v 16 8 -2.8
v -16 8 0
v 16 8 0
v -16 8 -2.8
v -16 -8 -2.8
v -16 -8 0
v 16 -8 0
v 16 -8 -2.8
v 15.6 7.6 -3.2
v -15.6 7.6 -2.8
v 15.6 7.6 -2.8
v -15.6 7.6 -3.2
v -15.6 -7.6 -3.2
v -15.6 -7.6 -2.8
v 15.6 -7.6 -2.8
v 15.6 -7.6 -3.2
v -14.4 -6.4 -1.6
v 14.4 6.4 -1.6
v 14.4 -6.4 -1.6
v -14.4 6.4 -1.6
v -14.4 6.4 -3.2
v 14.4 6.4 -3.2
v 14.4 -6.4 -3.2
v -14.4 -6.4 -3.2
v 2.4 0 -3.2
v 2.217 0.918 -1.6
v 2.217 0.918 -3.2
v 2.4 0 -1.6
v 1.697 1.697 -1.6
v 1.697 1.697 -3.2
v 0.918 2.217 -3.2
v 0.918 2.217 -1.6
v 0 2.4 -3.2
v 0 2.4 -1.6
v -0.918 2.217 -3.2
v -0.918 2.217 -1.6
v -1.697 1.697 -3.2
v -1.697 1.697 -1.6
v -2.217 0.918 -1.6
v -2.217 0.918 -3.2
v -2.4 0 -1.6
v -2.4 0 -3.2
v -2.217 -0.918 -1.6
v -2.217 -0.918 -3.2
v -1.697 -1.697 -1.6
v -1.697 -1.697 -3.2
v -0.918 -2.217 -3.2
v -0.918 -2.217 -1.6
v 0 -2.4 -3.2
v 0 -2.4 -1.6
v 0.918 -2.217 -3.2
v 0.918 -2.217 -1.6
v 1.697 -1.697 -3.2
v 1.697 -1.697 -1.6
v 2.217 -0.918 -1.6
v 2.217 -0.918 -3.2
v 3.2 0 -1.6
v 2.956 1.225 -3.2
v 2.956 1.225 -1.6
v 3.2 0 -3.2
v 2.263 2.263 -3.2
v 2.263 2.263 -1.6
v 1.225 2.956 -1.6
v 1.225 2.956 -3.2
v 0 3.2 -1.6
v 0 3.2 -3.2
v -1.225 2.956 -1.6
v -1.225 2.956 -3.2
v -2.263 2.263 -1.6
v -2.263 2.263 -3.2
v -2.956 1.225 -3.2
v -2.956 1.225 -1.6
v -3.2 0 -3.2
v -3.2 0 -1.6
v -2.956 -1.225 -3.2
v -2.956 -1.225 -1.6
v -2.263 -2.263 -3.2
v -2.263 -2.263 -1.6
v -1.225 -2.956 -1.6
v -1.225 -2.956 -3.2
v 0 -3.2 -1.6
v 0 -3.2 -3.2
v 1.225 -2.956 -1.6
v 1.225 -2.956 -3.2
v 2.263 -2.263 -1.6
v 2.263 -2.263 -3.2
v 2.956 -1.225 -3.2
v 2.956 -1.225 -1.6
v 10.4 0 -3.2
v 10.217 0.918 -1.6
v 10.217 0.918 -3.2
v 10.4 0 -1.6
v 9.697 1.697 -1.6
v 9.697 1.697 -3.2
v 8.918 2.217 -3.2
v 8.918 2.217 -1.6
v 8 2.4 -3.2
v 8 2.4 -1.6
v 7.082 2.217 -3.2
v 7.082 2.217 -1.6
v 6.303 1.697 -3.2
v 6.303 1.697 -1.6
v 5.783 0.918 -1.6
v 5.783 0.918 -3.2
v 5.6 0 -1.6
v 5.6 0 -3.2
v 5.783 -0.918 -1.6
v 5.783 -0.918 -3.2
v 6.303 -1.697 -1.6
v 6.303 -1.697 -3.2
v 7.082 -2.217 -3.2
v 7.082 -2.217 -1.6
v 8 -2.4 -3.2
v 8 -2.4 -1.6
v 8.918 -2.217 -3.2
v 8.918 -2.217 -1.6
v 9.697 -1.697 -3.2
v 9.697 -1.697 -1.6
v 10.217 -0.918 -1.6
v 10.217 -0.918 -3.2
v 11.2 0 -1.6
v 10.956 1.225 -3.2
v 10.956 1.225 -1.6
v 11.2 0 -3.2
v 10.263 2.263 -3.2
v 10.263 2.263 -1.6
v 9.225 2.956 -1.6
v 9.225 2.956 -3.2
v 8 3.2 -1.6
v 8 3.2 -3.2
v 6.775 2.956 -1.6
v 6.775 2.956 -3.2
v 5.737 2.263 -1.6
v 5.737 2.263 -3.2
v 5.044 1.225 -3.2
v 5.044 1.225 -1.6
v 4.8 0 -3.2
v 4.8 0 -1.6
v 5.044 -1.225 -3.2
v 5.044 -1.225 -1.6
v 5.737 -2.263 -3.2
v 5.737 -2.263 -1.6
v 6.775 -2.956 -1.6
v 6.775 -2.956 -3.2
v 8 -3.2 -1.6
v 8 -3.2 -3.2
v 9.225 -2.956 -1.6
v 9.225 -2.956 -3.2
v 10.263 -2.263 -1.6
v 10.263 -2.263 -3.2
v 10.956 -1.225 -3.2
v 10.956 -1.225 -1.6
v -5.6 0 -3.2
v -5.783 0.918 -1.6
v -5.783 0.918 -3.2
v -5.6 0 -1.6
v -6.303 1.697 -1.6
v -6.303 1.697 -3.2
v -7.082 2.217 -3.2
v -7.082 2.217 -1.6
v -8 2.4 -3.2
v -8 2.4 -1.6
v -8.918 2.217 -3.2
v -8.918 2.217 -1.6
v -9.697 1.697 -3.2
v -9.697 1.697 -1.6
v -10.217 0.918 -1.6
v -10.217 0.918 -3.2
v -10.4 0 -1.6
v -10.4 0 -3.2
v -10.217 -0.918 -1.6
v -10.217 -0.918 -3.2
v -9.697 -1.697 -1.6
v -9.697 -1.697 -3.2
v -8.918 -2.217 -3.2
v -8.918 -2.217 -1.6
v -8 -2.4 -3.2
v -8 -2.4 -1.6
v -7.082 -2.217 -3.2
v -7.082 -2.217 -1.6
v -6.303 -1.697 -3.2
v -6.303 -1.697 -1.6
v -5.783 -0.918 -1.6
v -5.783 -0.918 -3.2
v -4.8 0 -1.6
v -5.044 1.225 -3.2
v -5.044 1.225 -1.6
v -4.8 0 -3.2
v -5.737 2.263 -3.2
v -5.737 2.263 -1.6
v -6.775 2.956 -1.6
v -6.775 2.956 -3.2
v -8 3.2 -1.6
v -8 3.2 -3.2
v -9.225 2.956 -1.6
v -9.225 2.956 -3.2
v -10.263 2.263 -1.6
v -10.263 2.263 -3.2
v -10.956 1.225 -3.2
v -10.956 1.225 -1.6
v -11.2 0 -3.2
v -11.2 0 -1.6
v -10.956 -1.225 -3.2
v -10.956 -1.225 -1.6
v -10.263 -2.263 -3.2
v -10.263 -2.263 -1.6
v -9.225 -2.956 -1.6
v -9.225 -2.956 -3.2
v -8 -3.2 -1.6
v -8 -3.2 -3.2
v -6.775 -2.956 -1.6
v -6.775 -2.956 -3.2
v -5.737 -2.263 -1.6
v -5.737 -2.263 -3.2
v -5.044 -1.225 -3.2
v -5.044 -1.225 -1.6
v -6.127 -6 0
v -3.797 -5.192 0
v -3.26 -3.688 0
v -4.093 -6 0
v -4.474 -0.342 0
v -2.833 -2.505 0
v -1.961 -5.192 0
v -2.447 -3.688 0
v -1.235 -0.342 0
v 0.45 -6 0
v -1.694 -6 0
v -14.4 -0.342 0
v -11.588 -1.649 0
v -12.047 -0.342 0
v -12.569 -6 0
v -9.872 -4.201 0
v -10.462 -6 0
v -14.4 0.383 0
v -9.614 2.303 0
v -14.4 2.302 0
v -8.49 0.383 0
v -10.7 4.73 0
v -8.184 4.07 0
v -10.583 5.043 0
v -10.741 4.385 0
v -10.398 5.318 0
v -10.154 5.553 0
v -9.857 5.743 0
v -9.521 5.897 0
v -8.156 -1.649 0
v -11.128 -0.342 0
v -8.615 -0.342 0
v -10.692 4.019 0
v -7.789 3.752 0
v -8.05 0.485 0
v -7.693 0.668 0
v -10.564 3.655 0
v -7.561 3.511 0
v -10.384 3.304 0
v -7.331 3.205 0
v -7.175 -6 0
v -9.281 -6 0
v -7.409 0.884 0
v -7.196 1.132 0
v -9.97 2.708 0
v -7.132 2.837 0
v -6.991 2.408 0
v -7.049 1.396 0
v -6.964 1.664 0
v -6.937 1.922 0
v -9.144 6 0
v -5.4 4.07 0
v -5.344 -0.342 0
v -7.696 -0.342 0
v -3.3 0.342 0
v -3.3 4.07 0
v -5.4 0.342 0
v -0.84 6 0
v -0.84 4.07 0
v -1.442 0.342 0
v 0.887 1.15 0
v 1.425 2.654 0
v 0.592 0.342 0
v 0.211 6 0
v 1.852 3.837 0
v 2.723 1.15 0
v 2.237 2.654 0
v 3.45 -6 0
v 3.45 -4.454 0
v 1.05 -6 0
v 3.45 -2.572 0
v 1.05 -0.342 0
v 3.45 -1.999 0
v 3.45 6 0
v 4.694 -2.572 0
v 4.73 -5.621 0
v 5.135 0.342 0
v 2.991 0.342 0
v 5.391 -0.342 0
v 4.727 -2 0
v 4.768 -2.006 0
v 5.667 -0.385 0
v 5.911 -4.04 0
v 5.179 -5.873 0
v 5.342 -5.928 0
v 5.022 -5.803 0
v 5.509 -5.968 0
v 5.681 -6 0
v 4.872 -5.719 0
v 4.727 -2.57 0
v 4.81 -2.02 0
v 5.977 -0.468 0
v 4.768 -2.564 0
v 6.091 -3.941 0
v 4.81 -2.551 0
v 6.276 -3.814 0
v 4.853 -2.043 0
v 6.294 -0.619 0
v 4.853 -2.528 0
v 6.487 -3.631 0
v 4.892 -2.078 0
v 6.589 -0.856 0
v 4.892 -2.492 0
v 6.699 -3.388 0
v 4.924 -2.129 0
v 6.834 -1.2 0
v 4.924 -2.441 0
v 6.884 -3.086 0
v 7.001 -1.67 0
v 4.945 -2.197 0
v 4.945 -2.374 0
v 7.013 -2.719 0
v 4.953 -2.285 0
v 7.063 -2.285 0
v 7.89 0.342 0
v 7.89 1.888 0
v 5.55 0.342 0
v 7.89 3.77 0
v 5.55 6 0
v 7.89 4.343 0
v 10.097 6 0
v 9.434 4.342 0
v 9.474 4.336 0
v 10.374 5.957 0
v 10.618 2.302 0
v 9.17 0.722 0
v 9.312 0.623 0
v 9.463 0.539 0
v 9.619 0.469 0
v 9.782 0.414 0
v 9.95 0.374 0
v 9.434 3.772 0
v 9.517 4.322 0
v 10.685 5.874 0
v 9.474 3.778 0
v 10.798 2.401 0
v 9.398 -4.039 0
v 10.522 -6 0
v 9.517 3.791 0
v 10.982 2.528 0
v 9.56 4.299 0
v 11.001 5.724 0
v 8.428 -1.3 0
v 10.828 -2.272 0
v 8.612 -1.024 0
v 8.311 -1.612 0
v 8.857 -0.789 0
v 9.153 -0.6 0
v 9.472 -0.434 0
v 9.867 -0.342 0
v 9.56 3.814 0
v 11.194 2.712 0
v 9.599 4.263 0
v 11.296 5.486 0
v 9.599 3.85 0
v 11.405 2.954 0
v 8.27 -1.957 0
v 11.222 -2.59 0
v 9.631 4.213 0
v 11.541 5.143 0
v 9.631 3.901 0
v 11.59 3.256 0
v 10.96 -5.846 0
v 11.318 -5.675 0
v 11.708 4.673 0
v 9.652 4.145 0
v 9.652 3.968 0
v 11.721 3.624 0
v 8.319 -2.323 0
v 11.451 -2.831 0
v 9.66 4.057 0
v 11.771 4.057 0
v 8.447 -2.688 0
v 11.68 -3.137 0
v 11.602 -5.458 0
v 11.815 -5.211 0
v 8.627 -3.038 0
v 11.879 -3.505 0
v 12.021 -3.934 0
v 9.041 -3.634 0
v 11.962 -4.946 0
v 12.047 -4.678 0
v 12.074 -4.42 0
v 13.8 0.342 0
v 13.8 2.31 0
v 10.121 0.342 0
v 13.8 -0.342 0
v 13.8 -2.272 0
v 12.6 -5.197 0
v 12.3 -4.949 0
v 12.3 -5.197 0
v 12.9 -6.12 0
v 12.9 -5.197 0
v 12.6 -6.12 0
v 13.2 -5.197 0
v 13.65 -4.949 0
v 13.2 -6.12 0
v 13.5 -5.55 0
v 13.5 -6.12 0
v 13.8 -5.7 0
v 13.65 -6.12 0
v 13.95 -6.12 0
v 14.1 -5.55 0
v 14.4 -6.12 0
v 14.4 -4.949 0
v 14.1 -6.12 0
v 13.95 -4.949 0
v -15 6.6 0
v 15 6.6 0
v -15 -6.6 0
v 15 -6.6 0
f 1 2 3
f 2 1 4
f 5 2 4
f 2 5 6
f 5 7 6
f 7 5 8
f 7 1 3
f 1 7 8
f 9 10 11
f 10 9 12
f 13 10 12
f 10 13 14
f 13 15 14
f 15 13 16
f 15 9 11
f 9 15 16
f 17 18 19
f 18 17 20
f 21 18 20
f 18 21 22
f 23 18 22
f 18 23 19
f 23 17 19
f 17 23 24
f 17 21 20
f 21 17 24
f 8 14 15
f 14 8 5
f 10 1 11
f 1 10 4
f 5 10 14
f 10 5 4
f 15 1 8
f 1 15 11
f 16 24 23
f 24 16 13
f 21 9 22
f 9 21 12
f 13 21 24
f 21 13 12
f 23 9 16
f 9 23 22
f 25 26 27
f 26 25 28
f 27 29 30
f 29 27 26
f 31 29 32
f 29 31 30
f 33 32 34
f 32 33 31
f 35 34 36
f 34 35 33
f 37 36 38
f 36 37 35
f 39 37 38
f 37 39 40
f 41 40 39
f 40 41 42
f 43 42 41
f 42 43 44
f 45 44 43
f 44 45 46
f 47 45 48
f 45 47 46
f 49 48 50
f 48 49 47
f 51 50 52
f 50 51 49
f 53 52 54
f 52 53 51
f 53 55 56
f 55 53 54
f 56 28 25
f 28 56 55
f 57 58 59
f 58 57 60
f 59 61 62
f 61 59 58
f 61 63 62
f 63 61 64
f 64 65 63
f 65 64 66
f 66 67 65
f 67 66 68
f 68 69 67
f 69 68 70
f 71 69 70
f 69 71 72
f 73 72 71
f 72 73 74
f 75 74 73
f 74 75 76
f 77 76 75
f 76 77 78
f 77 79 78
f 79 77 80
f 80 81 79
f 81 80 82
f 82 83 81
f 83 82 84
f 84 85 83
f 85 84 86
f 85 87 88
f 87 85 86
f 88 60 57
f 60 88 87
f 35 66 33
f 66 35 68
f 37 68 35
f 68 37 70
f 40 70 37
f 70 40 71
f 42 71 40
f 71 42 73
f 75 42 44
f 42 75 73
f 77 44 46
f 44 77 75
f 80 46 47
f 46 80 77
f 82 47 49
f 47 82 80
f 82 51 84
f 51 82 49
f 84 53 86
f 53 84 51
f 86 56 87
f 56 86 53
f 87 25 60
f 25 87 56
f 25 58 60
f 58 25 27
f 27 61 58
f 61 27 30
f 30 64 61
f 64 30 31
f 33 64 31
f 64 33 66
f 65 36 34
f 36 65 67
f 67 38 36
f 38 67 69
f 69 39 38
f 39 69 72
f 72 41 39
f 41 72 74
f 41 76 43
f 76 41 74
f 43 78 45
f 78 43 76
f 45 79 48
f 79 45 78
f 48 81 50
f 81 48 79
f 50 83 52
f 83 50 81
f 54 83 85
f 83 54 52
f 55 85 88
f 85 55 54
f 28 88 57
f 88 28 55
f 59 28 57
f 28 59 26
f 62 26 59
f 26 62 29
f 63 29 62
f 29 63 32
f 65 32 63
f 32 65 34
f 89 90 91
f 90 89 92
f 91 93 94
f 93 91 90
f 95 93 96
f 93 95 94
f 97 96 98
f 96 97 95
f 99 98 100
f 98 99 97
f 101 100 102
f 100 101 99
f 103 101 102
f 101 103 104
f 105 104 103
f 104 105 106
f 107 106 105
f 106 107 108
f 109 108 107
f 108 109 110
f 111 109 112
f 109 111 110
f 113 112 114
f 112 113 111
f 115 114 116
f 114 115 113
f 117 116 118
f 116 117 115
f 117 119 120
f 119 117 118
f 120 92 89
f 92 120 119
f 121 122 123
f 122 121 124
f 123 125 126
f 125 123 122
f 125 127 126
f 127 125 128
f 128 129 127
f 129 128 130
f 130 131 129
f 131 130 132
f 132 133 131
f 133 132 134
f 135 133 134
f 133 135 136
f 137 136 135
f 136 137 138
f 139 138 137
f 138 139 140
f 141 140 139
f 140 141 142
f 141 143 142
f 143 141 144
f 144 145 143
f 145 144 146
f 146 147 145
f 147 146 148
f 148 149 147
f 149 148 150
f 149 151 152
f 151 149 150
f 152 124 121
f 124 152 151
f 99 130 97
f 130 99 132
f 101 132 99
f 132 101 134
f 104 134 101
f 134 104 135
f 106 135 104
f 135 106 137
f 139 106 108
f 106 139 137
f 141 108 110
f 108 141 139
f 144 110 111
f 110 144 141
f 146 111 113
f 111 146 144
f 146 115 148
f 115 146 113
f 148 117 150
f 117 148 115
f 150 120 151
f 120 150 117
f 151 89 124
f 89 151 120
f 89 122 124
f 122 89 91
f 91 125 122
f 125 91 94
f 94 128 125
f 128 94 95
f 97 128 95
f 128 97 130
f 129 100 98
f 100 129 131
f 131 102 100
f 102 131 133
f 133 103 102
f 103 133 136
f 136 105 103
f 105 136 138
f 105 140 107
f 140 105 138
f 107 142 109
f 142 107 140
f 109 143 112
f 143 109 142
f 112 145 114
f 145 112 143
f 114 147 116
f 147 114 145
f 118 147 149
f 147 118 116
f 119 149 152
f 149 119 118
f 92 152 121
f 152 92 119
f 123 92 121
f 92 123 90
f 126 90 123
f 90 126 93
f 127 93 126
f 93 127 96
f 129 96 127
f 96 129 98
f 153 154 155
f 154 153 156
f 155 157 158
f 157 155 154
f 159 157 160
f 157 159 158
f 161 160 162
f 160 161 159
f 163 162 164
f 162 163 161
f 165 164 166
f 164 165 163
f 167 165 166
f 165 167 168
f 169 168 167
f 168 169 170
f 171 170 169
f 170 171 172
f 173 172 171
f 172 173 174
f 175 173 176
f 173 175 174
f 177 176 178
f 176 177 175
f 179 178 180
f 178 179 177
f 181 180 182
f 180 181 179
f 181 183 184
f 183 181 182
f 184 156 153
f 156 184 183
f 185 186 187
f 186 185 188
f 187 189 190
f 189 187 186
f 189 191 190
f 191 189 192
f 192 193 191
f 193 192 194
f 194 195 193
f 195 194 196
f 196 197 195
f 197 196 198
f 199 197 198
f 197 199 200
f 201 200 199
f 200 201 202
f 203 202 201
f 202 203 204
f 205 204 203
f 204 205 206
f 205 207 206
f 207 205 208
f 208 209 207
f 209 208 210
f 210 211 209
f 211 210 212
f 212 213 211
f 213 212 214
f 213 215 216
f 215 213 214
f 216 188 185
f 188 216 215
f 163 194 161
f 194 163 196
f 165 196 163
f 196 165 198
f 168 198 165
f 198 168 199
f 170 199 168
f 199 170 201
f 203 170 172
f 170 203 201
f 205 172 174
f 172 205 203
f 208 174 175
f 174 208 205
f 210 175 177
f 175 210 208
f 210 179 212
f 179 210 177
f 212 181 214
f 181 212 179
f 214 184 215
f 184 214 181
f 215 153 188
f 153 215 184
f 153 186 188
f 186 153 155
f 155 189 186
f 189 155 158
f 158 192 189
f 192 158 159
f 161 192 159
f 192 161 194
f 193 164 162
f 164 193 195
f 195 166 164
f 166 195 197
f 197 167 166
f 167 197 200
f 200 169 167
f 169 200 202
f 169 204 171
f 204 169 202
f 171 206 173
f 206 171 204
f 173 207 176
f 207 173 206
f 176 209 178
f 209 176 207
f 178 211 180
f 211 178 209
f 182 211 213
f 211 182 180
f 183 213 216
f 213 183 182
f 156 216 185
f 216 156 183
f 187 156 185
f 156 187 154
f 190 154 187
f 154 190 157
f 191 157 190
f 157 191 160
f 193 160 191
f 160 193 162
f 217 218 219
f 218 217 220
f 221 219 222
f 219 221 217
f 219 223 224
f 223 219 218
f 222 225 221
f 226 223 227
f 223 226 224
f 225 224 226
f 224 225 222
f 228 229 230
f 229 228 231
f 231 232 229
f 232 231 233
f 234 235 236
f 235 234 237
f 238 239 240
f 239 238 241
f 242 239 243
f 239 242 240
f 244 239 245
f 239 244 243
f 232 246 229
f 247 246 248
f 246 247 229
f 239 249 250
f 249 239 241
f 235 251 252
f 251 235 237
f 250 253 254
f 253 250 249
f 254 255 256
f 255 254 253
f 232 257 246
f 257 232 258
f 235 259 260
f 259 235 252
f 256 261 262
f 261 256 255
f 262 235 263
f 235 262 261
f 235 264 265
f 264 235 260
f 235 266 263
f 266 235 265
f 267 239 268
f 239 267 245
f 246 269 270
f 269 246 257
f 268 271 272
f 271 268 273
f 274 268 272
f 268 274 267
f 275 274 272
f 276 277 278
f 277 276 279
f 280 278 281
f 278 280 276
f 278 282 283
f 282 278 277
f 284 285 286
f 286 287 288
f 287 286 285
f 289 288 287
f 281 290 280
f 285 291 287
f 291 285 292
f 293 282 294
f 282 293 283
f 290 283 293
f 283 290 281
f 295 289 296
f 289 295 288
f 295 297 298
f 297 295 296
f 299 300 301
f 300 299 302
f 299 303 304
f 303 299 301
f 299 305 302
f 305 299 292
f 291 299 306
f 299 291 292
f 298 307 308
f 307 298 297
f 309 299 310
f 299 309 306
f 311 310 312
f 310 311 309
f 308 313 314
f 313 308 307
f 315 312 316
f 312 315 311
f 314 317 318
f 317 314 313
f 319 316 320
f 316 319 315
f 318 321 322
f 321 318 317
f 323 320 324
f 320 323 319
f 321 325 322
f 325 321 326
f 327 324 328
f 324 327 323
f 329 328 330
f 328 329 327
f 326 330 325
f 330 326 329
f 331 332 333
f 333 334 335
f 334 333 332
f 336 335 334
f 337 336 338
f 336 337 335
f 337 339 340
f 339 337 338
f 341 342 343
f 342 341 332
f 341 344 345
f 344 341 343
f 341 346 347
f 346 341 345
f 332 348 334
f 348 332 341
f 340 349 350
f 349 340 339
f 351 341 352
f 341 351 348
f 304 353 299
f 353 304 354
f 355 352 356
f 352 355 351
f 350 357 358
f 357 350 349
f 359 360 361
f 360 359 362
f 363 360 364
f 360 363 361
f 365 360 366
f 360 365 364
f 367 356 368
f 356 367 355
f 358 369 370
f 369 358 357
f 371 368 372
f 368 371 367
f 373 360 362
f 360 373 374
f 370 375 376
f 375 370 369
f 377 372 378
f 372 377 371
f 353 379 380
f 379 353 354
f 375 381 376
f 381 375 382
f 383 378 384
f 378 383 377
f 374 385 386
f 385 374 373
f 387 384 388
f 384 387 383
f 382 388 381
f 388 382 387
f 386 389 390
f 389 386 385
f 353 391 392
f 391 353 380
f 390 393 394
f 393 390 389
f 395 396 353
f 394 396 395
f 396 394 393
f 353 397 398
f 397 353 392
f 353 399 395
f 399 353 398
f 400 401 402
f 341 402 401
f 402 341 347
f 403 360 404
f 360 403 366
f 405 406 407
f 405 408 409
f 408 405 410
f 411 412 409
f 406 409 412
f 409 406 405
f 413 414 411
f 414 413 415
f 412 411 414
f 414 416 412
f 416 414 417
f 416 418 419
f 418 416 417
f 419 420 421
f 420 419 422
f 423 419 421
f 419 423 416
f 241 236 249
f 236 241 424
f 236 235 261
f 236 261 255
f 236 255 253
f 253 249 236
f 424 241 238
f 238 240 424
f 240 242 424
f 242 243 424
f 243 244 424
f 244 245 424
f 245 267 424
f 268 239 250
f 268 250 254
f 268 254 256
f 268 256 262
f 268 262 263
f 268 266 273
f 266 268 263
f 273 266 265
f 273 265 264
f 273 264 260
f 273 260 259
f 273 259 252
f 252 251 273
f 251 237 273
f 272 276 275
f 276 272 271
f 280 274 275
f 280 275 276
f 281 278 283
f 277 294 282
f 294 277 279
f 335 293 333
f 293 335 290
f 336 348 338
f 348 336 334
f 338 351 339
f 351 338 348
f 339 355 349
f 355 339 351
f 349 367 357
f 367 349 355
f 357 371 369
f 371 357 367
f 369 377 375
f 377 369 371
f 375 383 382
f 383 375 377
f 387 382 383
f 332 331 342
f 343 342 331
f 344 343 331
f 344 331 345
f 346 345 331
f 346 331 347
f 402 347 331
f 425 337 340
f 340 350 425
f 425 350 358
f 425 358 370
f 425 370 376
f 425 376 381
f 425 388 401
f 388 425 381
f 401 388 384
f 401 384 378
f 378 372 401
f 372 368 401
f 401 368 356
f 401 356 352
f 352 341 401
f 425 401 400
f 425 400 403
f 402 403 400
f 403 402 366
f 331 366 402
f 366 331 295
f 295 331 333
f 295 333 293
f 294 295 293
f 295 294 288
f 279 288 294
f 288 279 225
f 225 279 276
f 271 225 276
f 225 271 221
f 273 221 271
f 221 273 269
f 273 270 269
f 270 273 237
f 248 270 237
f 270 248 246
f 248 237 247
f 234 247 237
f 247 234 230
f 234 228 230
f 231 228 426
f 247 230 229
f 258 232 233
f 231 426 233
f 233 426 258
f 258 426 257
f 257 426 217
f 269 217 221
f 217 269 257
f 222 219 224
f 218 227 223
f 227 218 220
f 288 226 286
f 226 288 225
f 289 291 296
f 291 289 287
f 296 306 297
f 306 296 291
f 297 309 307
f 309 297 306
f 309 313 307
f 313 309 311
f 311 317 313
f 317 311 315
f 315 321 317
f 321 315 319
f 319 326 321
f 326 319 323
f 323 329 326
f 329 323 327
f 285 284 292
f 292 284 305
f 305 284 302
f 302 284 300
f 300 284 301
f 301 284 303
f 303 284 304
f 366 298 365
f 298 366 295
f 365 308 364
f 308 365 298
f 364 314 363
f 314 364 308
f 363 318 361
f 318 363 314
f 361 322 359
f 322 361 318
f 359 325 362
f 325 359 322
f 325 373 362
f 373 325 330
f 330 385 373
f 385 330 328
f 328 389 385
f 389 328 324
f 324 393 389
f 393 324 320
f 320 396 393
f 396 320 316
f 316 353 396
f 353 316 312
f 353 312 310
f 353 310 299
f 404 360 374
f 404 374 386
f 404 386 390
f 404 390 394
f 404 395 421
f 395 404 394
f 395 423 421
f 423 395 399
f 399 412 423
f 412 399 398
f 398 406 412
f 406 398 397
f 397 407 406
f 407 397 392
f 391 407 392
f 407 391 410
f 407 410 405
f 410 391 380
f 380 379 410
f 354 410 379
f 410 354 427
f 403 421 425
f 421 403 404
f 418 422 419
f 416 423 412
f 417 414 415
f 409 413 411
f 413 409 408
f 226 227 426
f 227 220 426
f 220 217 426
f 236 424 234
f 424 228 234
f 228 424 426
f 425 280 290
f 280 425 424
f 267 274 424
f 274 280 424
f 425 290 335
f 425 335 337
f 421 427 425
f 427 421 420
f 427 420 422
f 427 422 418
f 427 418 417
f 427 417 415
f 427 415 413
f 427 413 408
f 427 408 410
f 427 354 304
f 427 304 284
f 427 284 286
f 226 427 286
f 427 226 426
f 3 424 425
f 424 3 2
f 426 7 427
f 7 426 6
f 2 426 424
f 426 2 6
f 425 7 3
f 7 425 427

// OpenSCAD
use <../lib.scad>
use <s/87079s01.scad>
use <s/logostarwars01.scad>
function ldraw_lib__87079ps0() = [
// 0 Tile  2 x  4 with Star Wars Logo Pattern
// 0 Name: 87079ps0.dat
// 0 Author: Marc Giraudet [Mad_Marc]
// 0 !LDRAW_ORG Part UPDATE 2023-06
// 0 !LICENSE Licensed under CC BY 4.0 : see CAreadme.txt
// 
// 0 BFC CERTIFY CCW
  [0,"BFC","CERTIFY"],
  [0,"BFC","CCW"],
// 
// 0 !KEYWORDS BrickLink 87079pb0748, Set 31200
// 
// 0 !HISTORY 2023-11-19 [OrionP] Official Update 2023-06
// 
// 
// 1 16 0 0 0 1 0 0 0 1 0 0 0 1 s\87079s01.dat
  [1,16,0,0,0,1,0,0,0,1,0,0,0,1, ldraw_lib__s__87079s01()],
// 1 16 -37.5 0 16.5 0.75 0 0 0 0 1 0 -0.75 0 s\logostarwars01.dat
  [1,16,-37.5,0,16.5,0.75,0,0,0,0,1,0,-0.75,0, ldraw_lib__s__logostarwars01()],
// 4 16 -40 0 20 -37.5 0 16.5 37.5 0 16.5 40 0 20
  [4,16,-40,0,20,-37.5,0,16.5,37.5,0,16.5,40,0,20],
// 4 16 40 0 -20 37.5 0 -16.5 -37.5 0 -16.5 -40 0 -20
  [4,16,40,0,-20,37.5,0,-16.5,-37.5,0,-16.5,-40,0,-20],
// 4 16 -40 0 20 -40 0 -20 -37.5 0 -16.5 -37.5 0 16.5
  [4,16,-40,0,20,-40,0,-20,-37.5,0,-16.5,-37.5,0,16.5],
// 4 16 40 0 -20 40 0 20 37.5 0 16.5 37.5 0 -16.5
  [4,16,40,0,-20,40,0,20,37.5,0,16.5,37.5,0,-16.5],
];
module ldraw_lib__87079ps0(step=0, col=false, unit=2/5, alt=false, line=0.2, solid=!$preview)
    makepoly(ldraw_lib__87079ps0(), step=step, col=col, unit=unit, alt=alt, line=line, solid=solid);
ldraw_lib__87079ps0(line=0.2);
